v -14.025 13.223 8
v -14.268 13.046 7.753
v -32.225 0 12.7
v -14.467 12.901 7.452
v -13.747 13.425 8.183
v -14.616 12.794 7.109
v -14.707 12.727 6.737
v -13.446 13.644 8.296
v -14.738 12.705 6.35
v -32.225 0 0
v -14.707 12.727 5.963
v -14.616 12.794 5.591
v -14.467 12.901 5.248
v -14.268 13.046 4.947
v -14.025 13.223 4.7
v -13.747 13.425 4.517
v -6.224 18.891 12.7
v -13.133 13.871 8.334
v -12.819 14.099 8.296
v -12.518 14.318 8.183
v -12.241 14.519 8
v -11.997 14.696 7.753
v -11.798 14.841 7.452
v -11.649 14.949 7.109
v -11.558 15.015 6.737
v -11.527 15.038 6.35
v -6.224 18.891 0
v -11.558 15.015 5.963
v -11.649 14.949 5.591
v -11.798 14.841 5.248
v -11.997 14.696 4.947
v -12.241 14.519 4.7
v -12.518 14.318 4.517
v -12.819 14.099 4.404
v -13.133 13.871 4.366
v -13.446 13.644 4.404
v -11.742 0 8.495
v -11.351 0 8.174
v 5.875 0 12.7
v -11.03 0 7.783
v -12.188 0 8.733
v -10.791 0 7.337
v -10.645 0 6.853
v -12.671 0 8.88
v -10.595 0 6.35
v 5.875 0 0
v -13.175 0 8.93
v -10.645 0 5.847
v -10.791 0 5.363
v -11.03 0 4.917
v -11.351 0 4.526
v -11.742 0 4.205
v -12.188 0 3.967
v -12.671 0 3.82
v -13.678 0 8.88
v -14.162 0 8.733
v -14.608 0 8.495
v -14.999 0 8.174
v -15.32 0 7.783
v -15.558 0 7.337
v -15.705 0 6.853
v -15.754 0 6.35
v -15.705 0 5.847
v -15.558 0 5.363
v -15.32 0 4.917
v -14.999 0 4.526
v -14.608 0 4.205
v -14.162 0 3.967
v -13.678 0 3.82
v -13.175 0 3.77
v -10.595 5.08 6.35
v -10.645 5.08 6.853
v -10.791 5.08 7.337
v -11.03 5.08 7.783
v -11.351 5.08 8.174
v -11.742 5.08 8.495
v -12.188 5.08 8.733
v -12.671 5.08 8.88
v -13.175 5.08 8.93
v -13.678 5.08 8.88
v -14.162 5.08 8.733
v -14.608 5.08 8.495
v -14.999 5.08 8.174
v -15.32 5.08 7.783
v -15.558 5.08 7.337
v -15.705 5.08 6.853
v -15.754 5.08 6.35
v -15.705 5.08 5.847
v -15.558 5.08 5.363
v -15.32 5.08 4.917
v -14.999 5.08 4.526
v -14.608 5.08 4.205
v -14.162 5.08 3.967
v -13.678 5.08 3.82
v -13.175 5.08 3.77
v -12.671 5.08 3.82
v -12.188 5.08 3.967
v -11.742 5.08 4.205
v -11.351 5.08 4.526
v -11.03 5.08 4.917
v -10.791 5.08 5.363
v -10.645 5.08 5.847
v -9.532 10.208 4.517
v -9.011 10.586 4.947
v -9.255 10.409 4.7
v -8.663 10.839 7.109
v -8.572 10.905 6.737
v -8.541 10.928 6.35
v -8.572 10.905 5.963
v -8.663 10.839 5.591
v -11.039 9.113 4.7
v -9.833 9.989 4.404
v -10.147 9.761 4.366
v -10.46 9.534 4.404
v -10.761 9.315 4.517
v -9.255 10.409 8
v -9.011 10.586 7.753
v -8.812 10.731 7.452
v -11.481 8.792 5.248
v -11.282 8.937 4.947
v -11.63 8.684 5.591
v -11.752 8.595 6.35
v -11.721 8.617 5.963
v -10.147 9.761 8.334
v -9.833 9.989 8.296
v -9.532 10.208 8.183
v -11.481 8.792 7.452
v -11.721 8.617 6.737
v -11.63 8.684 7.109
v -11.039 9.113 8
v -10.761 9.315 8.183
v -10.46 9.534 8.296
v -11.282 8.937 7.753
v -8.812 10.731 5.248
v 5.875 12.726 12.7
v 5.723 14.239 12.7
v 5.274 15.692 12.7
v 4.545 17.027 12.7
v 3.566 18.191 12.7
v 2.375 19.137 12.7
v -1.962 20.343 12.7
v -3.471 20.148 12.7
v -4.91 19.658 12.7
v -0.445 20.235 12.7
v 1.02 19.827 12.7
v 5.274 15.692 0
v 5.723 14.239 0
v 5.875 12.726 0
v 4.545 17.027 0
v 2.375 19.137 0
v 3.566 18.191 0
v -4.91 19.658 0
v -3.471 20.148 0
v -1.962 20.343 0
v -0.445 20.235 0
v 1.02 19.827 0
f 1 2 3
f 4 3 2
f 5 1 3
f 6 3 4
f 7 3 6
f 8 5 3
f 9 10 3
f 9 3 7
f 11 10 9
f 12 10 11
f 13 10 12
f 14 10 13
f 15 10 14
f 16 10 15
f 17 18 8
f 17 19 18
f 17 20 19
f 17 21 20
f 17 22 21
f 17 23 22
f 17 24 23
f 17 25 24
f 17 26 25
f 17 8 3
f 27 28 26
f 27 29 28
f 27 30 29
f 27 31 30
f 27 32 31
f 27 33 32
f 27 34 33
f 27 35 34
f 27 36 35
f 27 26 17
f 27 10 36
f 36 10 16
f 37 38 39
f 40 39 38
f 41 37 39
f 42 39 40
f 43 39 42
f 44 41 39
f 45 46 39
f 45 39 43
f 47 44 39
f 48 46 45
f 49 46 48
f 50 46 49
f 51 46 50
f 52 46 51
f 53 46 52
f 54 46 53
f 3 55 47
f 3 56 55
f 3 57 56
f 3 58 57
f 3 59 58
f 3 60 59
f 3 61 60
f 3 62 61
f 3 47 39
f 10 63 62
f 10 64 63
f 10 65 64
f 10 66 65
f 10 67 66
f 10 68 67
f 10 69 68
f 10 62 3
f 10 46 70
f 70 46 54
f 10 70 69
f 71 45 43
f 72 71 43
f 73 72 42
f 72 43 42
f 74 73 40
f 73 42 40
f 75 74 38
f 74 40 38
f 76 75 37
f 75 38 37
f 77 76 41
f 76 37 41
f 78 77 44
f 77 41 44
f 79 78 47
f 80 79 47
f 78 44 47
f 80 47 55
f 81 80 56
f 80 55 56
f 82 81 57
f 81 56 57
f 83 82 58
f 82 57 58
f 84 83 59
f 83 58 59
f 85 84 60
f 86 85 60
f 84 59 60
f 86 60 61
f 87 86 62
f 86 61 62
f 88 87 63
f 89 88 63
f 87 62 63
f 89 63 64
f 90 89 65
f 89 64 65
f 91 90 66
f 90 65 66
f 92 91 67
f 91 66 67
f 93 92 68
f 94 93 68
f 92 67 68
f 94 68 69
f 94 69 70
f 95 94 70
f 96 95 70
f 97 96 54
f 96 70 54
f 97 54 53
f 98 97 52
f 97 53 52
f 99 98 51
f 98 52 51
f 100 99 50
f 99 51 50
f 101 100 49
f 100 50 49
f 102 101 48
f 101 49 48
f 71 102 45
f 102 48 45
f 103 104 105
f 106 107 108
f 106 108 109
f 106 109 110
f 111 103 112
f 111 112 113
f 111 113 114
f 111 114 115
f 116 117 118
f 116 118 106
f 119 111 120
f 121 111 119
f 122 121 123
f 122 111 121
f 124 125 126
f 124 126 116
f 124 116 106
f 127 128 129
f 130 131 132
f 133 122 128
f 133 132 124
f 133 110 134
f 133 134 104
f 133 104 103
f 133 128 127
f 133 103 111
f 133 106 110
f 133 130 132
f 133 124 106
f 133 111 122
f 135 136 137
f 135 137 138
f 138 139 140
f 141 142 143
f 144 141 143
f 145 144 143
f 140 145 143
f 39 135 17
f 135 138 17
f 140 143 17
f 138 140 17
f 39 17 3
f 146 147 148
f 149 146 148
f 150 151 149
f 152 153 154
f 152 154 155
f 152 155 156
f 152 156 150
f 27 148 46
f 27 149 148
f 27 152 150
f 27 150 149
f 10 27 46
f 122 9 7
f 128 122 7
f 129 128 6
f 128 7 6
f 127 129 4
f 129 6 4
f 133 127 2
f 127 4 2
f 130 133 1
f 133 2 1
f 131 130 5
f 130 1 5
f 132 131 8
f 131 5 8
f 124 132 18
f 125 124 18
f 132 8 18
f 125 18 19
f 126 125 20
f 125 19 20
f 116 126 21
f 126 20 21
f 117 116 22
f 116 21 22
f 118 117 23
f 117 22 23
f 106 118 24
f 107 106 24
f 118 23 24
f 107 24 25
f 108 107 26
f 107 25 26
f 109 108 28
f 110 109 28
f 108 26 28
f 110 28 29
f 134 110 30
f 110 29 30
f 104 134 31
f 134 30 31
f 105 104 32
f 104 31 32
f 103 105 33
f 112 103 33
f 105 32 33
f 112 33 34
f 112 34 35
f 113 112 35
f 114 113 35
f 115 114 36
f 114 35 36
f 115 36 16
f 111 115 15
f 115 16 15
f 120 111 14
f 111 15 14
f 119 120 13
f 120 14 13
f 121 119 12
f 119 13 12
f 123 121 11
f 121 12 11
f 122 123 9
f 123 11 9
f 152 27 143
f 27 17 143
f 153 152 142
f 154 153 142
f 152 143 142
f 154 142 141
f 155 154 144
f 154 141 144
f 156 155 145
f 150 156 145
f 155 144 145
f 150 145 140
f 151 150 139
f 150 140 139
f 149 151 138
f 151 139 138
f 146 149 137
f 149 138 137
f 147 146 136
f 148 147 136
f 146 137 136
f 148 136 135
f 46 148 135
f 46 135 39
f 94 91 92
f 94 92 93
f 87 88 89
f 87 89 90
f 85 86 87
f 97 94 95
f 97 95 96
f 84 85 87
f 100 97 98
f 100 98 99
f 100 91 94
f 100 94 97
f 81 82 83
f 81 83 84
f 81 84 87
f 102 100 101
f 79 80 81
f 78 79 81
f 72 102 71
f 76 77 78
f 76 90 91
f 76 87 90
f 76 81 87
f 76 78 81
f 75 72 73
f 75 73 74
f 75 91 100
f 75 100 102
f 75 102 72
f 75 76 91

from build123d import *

# Parameters (mm, degrees)
BOSS_EXTRUDE1_DEPTH = 12.7
SKETCH2_R           = 2.5796875
CUT_EXTRUDE1_DEPTH  = 5.08
SKETCH3_R           = 1.984375
CUT_EXTRUDE2_DEPTH  = 5.08
FILLET1_R           = 7.62


with BuildPart() as part:
    # Sketch1 → Boss-Extrude1 (new body)
    with BuildSketch(Plane.XY):
        Polygon((-32.22474981, 0), (5.87525019, 27.681270317), (5.87525019, 0), align=None)
    extrude(amount=BOSS_EXTRUDE1_DEPTH)

    # Sketch2 → Cut-Extrude1 (cut)
    with BuildSketch(Plane.XZ):
        with Locations((-13.17474981, 6.35)):
            Circle(SKETCH2_R)
    extrude(amount=-CUT_EXTRUDE1_DEPTH, mode=Mode.SUBTRACT)

    # Sketch3 → Cut-Extrude2 (cut)
    with BuildSketch(Plane(origin=(-11.13337724, 15.323779146, 0), x_dir=(0.8090169943749507, 0.5877852522924687, 0), z_dir=(-0.5877852522924687, 0.8090169943749507, 0))):
        with Locations(Location((-2.471180293, -6.35, 0), (0, 0, 180))):
            Circle(SKETCH3_R)
    extrude(amount=-CUT_EXTRUDE2_DEPTH, mode=Mode.SUBTRACT)

    # Fillet1
    fillet1_edges = [part.edges().sort_by_distance(p)[0] for p in [
        (5.87525019, 27.681270317, 6.35),
    ]]
    fillet(fillet1_edges, radius=FILLET1_R)


solid = part.part
